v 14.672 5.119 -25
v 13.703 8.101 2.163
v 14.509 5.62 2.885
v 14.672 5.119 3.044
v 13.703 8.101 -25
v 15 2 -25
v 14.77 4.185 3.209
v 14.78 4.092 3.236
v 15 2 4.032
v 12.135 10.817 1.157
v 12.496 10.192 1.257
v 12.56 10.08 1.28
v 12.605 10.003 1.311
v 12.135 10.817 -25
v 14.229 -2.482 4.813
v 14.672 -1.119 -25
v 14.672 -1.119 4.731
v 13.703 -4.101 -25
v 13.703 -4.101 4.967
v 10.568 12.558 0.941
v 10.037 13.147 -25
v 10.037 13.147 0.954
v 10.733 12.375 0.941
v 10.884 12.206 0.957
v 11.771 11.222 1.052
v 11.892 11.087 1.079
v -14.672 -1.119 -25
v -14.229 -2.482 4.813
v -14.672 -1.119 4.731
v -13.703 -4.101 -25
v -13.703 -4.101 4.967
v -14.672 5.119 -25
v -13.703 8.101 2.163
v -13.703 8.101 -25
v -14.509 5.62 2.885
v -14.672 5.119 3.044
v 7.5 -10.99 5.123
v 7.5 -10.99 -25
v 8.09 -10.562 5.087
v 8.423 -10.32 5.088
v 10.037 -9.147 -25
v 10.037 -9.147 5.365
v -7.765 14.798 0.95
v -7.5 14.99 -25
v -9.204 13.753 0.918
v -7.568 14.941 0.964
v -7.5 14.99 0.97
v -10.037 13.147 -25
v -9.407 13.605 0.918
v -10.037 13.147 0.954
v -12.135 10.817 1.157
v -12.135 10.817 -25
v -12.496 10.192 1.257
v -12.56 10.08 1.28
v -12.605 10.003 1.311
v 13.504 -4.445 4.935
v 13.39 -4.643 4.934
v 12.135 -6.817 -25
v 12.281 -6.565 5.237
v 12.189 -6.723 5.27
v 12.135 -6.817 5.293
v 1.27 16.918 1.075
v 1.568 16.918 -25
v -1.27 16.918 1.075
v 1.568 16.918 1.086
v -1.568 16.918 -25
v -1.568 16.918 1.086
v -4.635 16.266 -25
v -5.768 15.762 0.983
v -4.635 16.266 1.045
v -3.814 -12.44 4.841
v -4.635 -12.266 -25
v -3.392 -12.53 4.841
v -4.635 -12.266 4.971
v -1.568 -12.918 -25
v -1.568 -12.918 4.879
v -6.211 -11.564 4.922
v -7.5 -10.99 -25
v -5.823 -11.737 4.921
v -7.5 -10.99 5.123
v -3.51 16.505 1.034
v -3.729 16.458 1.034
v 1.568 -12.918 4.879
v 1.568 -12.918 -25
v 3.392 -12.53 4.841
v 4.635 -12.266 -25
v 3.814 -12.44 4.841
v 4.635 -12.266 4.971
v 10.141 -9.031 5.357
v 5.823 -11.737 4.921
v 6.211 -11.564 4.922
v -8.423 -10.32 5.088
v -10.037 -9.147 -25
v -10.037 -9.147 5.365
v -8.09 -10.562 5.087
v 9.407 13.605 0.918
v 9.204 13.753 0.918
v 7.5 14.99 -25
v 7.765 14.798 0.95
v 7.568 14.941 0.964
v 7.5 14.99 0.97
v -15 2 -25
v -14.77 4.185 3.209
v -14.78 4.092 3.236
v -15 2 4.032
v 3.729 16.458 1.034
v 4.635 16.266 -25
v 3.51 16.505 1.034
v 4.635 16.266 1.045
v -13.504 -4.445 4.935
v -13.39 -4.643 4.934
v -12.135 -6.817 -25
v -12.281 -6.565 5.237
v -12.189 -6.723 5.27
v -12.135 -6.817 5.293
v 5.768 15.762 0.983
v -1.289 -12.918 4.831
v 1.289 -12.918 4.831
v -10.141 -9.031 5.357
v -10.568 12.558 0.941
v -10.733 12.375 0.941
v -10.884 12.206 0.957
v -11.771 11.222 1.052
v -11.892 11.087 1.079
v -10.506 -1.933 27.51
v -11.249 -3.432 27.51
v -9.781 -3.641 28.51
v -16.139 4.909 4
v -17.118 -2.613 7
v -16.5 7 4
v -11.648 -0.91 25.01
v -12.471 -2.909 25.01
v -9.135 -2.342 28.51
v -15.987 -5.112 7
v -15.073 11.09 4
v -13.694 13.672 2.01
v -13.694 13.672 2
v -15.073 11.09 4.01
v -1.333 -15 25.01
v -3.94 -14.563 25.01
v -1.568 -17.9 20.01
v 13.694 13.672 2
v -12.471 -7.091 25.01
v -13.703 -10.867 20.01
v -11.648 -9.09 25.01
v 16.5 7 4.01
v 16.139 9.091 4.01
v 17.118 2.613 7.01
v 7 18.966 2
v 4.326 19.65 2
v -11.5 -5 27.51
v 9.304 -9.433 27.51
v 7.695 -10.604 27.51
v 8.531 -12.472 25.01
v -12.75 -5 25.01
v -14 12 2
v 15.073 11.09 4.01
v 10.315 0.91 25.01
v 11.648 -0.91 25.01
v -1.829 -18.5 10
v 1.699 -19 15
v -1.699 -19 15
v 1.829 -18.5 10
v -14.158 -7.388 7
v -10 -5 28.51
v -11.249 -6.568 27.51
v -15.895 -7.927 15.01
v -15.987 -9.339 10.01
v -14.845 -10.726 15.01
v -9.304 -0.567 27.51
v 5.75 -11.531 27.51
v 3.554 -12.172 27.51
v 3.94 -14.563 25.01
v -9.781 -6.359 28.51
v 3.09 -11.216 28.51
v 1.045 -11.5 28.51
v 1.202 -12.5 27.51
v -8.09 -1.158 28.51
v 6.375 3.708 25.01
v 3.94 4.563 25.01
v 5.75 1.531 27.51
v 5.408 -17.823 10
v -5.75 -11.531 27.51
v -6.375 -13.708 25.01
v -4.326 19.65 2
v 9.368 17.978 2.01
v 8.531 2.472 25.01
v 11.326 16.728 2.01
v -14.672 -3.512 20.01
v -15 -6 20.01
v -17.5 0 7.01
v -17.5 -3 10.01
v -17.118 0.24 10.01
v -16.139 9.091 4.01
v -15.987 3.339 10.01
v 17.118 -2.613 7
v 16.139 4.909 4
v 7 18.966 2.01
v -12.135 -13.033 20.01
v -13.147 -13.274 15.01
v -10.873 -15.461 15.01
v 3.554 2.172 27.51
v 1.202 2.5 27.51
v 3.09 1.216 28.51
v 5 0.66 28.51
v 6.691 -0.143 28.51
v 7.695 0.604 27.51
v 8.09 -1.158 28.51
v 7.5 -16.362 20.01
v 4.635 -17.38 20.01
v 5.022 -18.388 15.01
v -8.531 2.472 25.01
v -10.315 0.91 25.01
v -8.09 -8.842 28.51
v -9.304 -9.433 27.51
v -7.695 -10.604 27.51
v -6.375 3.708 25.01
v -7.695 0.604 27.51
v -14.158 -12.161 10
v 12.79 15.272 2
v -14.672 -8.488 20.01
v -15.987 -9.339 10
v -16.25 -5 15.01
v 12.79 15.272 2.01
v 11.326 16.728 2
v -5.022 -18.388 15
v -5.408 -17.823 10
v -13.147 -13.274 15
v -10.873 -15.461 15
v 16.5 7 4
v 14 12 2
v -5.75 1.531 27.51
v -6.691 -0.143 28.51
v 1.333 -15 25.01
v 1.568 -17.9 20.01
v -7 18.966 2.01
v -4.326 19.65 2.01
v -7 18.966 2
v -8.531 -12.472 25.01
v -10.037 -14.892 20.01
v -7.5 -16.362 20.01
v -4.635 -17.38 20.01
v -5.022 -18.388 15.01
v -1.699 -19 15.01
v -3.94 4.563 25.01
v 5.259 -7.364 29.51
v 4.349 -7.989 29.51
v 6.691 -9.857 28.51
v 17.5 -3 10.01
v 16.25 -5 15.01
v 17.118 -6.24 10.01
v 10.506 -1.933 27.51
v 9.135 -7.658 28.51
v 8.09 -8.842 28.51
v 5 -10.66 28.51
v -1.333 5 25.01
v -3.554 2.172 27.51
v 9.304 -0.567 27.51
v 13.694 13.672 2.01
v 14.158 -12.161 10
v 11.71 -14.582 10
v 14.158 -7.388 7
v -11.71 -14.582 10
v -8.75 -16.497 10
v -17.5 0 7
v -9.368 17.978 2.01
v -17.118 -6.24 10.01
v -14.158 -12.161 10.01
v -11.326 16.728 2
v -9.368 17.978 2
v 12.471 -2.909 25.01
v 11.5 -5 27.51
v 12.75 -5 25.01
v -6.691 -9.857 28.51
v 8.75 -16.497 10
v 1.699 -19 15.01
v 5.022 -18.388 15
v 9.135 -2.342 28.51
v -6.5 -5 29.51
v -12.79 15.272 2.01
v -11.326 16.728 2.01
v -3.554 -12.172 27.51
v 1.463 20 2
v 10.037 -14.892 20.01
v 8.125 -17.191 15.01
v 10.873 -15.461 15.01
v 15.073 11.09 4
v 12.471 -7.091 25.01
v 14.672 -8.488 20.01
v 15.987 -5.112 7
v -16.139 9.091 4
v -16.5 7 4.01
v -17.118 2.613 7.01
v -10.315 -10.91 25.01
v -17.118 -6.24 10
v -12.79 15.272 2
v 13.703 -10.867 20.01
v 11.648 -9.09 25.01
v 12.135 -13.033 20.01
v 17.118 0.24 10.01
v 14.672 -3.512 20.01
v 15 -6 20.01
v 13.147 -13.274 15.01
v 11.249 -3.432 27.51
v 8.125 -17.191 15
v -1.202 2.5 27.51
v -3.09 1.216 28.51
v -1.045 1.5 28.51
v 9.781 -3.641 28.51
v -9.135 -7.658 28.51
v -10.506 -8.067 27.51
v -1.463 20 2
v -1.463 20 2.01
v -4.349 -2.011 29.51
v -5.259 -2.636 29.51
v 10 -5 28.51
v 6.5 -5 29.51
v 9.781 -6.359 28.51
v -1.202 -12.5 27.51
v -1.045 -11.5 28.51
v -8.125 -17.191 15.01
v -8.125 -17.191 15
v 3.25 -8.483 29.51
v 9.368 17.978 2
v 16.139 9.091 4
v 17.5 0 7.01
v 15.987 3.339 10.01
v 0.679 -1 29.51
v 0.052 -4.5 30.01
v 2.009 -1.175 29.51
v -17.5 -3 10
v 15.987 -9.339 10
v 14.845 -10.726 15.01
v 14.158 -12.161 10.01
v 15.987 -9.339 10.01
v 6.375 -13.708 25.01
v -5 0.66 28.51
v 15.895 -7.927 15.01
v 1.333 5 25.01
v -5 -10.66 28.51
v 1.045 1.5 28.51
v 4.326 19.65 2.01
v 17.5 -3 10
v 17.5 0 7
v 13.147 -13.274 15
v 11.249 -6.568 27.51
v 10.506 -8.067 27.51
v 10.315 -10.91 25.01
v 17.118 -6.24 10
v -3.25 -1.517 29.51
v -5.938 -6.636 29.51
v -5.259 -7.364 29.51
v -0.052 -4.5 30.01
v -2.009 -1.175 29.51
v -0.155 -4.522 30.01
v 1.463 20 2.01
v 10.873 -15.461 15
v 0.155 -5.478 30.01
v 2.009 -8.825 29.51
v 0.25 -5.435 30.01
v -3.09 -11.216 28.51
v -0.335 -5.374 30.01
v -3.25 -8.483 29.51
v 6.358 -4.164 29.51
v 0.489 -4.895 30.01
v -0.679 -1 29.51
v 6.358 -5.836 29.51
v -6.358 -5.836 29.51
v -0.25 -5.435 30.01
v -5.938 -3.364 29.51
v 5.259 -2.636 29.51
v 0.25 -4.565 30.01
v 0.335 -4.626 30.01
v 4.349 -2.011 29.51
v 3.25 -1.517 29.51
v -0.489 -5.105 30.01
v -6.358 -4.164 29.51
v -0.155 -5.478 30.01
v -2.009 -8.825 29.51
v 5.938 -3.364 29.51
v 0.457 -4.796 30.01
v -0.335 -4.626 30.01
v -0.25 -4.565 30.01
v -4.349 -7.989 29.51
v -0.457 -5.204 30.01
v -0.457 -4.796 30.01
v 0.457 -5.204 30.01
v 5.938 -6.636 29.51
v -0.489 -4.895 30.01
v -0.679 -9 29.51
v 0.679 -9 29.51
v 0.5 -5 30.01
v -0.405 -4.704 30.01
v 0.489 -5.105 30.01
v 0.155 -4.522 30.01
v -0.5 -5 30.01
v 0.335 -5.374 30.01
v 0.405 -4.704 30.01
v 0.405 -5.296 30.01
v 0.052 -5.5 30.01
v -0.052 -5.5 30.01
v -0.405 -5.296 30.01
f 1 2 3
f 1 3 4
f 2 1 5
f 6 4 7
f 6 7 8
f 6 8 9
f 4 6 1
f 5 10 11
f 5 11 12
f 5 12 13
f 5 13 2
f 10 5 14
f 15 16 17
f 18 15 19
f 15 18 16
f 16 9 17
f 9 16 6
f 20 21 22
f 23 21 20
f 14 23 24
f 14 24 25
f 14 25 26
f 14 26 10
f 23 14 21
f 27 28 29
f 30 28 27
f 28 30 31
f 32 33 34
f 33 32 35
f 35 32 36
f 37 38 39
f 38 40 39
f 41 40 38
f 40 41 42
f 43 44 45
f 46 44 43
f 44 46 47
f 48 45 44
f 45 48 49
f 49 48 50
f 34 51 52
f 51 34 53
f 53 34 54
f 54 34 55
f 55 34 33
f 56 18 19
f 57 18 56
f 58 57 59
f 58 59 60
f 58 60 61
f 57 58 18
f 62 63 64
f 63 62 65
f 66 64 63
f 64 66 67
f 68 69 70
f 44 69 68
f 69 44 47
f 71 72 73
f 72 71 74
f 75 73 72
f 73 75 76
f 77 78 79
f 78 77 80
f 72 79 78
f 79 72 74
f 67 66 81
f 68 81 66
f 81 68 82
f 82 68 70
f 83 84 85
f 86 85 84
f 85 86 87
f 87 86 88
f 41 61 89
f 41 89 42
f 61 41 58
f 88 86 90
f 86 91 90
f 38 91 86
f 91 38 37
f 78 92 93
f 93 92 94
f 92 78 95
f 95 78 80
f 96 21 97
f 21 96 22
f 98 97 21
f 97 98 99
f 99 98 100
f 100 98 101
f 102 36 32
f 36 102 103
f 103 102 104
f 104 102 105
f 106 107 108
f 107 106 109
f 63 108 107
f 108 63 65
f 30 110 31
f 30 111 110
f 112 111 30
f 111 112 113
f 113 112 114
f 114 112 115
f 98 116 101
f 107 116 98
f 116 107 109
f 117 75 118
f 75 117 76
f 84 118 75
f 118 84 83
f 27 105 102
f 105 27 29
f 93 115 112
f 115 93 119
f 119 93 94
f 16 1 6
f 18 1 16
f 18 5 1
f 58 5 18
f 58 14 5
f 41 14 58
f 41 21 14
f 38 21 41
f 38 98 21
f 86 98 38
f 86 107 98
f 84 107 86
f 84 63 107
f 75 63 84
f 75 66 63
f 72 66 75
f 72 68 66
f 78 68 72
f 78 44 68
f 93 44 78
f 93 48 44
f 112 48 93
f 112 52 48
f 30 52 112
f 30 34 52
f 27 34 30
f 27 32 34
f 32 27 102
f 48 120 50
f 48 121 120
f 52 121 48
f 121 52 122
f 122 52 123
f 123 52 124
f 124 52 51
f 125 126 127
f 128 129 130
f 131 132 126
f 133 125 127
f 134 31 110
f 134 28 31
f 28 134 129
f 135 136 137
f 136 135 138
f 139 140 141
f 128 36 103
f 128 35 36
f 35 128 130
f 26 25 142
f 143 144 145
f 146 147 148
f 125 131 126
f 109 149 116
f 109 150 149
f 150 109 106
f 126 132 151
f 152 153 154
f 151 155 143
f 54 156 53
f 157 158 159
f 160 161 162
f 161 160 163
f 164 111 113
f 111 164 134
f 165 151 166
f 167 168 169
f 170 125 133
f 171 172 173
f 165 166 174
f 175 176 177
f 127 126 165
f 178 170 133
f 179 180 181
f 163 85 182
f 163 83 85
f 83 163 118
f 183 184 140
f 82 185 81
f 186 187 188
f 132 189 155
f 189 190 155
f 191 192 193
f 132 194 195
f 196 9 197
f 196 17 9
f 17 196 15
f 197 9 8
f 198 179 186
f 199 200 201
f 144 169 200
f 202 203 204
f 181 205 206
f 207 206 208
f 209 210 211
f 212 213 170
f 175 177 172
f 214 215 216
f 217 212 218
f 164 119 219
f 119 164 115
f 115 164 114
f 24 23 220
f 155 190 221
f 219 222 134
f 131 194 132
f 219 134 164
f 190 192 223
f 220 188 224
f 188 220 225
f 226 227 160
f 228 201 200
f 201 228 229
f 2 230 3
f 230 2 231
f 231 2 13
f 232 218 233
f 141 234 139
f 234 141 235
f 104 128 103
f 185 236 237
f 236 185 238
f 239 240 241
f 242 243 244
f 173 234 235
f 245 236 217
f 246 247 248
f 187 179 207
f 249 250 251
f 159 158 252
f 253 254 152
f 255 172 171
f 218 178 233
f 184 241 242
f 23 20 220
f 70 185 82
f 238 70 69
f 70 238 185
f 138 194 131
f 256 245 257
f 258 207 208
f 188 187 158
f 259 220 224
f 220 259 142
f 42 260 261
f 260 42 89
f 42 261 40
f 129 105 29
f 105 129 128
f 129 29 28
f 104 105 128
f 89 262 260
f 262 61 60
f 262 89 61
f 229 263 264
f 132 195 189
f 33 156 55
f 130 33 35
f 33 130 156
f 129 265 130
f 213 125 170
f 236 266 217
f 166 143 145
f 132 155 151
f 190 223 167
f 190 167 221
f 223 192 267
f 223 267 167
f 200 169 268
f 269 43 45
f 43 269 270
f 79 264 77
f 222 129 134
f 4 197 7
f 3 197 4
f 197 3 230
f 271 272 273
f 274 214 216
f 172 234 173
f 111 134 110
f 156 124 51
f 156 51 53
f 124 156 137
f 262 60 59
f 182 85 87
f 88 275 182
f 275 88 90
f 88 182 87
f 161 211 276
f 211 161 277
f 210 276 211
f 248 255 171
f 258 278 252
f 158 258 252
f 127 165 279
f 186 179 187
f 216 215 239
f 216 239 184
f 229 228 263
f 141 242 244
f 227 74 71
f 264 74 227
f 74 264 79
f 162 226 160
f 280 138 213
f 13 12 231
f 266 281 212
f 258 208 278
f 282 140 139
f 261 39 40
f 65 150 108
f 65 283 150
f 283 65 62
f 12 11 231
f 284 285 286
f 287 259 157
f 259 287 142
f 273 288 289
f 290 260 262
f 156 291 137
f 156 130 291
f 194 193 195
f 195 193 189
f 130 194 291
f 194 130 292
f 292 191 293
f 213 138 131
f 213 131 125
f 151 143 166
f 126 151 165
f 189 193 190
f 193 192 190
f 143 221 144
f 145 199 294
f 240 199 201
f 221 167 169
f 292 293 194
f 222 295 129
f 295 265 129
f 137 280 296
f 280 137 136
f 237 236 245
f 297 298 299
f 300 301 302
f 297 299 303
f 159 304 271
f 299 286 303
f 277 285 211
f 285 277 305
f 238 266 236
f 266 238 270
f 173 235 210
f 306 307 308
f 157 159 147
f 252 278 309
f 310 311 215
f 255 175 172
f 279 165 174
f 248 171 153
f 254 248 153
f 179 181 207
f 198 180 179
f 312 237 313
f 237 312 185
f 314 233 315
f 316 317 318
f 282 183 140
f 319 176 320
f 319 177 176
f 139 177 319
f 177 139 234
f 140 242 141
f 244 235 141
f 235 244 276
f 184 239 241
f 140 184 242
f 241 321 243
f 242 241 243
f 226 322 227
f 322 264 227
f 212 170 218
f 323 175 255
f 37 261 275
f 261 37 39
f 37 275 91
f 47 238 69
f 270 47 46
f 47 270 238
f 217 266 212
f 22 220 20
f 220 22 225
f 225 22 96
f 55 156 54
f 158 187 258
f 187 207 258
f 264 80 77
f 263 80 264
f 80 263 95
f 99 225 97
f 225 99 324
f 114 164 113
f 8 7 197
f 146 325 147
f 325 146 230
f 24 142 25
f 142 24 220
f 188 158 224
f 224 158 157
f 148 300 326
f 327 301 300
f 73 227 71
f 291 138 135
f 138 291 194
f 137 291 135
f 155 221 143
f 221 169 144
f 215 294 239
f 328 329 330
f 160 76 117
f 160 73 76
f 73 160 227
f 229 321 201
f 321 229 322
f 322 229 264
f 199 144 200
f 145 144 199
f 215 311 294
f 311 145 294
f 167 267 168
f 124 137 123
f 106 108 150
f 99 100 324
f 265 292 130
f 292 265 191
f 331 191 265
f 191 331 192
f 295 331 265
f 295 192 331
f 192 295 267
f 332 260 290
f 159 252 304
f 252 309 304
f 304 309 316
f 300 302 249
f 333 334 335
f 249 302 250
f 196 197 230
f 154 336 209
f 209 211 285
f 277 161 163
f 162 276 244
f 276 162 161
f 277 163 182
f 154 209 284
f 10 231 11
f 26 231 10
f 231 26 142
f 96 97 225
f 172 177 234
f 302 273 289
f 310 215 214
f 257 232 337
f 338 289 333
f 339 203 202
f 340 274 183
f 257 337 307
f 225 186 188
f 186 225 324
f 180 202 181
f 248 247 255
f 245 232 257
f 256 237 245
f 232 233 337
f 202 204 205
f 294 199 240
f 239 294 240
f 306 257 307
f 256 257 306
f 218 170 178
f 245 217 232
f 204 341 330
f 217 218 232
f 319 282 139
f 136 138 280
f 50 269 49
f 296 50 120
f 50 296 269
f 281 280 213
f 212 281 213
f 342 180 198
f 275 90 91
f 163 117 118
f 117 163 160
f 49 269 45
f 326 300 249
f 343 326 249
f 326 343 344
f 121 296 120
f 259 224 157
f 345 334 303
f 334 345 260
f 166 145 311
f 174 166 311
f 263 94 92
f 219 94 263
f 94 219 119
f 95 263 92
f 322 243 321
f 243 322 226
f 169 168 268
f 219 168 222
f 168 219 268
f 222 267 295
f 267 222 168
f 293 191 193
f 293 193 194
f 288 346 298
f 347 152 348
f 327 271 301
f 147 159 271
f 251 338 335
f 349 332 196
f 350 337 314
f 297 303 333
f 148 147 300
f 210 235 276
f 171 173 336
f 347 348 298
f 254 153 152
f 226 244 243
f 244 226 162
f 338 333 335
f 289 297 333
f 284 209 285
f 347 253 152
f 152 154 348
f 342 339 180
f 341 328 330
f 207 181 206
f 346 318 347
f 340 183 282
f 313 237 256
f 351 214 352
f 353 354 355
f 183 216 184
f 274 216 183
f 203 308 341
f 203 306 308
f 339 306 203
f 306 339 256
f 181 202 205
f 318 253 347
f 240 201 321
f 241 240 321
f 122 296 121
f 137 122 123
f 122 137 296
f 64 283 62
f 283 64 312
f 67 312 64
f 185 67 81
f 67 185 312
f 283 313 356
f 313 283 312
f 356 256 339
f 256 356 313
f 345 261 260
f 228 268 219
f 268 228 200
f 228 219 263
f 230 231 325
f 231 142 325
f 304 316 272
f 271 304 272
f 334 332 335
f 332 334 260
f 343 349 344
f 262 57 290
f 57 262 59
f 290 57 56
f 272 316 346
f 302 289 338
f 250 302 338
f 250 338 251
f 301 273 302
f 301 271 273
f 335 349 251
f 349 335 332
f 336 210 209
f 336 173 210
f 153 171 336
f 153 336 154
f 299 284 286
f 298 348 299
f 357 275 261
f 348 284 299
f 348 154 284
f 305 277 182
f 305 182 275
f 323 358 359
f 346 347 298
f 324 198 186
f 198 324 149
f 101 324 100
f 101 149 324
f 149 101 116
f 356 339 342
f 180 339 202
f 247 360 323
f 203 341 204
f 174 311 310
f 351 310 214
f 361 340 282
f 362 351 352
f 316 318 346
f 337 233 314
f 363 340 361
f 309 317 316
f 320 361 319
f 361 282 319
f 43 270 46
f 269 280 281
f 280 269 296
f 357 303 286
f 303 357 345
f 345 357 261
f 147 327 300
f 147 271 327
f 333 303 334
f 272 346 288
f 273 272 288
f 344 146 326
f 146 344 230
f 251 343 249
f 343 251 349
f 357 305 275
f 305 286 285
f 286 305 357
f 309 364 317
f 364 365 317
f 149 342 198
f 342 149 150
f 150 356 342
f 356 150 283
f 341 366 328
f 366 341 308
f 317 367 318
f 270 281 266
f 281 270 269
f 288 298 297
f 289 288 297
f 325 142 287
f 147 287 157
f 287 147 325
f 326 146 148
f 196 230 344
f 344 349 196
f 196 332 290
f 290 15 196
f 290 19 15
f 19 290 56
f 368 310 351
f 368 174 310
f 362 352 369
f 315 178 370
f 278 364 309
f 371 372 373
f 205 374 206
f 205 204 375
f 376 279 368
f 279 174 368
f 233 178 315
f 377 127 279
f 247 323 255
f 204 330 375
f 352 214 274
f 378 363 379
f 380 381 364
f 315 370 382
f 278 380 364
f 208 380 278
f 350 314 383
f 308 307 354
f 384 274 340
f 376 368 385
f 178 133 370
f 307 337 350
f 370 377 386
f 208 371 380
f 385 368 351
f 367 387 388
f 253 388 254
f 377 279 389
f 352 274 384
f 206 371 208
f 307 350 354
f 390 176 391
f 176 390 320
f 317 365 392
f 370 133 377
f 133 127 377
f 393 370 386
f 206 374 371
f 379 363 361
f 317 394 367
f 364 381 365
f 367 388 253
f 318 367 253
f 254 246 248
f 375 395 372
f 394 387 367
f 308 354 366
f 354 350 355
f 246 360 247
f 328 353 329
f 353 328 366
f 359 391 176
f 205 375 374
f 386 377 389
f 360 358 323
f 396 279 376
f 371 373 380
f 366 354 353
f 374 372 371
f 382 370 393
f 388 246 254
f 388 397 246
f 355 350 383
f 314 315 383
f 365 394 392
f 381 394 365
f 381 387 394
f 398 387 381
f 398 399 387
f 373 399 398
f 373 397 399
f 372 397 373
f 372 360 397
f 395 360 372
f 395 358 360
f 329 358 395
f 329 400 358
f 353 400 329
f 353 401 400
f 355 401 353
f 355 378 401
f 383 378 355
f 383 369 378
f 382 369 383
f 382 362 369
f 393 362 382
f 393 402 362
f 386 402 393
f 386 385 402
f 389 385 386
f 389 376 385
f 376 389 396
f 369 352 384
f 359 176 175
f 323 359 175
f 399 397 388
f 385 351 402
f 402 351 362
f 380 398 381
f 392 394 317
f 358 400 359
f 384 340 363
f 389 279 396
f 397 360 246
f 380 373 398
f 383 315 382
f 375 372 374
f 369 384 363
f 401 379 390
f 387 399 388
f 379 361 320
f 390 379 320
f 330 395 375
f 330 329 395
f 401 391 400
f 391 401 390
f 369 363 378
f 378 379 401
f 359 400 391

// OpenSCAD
glansData = [
[0, 22.5, 10 , 10],
[12, 27, 28 , 16],
[7, 29, 33 , 20],
[0, 32, 35 , 25],
[-3, 35, 35 , 31],
[-5, 40, 32.5 , 28],
[-6, 45, 30 , 23.8],
[-5, 50, 25.5 , 20],
[-5, 52.5, 23 , 15],
[-5, 53.5, 20 , 13],
[-5, 54.5, 13 , 8],
[-5, 55, 1 , 1],
];

module positionedOval(px, py, pz, lx, ly){
    translate([px, py, pz])
        resize([lx, ly]) cylinder(d=20, h=0.01);
}


module glans(){
    hull(){
        for( i=[0 : len(glansData) -1])
            positionedOval(0, glansData[i][0], glansData[i][1], glansData[i][2], glansData[i][3]);   
    } 
}

module shaft(){
    translate([0, 2, 0]){
        difference() { 
            cylinder(h = 35, d = 30);
            translate([0, 11, 55])
                rotate([45, 0, 0])
                    cube(40,center = true);
        }
    }
}

translate([0,0,-25]) {
    glans();
    shaft();
}
